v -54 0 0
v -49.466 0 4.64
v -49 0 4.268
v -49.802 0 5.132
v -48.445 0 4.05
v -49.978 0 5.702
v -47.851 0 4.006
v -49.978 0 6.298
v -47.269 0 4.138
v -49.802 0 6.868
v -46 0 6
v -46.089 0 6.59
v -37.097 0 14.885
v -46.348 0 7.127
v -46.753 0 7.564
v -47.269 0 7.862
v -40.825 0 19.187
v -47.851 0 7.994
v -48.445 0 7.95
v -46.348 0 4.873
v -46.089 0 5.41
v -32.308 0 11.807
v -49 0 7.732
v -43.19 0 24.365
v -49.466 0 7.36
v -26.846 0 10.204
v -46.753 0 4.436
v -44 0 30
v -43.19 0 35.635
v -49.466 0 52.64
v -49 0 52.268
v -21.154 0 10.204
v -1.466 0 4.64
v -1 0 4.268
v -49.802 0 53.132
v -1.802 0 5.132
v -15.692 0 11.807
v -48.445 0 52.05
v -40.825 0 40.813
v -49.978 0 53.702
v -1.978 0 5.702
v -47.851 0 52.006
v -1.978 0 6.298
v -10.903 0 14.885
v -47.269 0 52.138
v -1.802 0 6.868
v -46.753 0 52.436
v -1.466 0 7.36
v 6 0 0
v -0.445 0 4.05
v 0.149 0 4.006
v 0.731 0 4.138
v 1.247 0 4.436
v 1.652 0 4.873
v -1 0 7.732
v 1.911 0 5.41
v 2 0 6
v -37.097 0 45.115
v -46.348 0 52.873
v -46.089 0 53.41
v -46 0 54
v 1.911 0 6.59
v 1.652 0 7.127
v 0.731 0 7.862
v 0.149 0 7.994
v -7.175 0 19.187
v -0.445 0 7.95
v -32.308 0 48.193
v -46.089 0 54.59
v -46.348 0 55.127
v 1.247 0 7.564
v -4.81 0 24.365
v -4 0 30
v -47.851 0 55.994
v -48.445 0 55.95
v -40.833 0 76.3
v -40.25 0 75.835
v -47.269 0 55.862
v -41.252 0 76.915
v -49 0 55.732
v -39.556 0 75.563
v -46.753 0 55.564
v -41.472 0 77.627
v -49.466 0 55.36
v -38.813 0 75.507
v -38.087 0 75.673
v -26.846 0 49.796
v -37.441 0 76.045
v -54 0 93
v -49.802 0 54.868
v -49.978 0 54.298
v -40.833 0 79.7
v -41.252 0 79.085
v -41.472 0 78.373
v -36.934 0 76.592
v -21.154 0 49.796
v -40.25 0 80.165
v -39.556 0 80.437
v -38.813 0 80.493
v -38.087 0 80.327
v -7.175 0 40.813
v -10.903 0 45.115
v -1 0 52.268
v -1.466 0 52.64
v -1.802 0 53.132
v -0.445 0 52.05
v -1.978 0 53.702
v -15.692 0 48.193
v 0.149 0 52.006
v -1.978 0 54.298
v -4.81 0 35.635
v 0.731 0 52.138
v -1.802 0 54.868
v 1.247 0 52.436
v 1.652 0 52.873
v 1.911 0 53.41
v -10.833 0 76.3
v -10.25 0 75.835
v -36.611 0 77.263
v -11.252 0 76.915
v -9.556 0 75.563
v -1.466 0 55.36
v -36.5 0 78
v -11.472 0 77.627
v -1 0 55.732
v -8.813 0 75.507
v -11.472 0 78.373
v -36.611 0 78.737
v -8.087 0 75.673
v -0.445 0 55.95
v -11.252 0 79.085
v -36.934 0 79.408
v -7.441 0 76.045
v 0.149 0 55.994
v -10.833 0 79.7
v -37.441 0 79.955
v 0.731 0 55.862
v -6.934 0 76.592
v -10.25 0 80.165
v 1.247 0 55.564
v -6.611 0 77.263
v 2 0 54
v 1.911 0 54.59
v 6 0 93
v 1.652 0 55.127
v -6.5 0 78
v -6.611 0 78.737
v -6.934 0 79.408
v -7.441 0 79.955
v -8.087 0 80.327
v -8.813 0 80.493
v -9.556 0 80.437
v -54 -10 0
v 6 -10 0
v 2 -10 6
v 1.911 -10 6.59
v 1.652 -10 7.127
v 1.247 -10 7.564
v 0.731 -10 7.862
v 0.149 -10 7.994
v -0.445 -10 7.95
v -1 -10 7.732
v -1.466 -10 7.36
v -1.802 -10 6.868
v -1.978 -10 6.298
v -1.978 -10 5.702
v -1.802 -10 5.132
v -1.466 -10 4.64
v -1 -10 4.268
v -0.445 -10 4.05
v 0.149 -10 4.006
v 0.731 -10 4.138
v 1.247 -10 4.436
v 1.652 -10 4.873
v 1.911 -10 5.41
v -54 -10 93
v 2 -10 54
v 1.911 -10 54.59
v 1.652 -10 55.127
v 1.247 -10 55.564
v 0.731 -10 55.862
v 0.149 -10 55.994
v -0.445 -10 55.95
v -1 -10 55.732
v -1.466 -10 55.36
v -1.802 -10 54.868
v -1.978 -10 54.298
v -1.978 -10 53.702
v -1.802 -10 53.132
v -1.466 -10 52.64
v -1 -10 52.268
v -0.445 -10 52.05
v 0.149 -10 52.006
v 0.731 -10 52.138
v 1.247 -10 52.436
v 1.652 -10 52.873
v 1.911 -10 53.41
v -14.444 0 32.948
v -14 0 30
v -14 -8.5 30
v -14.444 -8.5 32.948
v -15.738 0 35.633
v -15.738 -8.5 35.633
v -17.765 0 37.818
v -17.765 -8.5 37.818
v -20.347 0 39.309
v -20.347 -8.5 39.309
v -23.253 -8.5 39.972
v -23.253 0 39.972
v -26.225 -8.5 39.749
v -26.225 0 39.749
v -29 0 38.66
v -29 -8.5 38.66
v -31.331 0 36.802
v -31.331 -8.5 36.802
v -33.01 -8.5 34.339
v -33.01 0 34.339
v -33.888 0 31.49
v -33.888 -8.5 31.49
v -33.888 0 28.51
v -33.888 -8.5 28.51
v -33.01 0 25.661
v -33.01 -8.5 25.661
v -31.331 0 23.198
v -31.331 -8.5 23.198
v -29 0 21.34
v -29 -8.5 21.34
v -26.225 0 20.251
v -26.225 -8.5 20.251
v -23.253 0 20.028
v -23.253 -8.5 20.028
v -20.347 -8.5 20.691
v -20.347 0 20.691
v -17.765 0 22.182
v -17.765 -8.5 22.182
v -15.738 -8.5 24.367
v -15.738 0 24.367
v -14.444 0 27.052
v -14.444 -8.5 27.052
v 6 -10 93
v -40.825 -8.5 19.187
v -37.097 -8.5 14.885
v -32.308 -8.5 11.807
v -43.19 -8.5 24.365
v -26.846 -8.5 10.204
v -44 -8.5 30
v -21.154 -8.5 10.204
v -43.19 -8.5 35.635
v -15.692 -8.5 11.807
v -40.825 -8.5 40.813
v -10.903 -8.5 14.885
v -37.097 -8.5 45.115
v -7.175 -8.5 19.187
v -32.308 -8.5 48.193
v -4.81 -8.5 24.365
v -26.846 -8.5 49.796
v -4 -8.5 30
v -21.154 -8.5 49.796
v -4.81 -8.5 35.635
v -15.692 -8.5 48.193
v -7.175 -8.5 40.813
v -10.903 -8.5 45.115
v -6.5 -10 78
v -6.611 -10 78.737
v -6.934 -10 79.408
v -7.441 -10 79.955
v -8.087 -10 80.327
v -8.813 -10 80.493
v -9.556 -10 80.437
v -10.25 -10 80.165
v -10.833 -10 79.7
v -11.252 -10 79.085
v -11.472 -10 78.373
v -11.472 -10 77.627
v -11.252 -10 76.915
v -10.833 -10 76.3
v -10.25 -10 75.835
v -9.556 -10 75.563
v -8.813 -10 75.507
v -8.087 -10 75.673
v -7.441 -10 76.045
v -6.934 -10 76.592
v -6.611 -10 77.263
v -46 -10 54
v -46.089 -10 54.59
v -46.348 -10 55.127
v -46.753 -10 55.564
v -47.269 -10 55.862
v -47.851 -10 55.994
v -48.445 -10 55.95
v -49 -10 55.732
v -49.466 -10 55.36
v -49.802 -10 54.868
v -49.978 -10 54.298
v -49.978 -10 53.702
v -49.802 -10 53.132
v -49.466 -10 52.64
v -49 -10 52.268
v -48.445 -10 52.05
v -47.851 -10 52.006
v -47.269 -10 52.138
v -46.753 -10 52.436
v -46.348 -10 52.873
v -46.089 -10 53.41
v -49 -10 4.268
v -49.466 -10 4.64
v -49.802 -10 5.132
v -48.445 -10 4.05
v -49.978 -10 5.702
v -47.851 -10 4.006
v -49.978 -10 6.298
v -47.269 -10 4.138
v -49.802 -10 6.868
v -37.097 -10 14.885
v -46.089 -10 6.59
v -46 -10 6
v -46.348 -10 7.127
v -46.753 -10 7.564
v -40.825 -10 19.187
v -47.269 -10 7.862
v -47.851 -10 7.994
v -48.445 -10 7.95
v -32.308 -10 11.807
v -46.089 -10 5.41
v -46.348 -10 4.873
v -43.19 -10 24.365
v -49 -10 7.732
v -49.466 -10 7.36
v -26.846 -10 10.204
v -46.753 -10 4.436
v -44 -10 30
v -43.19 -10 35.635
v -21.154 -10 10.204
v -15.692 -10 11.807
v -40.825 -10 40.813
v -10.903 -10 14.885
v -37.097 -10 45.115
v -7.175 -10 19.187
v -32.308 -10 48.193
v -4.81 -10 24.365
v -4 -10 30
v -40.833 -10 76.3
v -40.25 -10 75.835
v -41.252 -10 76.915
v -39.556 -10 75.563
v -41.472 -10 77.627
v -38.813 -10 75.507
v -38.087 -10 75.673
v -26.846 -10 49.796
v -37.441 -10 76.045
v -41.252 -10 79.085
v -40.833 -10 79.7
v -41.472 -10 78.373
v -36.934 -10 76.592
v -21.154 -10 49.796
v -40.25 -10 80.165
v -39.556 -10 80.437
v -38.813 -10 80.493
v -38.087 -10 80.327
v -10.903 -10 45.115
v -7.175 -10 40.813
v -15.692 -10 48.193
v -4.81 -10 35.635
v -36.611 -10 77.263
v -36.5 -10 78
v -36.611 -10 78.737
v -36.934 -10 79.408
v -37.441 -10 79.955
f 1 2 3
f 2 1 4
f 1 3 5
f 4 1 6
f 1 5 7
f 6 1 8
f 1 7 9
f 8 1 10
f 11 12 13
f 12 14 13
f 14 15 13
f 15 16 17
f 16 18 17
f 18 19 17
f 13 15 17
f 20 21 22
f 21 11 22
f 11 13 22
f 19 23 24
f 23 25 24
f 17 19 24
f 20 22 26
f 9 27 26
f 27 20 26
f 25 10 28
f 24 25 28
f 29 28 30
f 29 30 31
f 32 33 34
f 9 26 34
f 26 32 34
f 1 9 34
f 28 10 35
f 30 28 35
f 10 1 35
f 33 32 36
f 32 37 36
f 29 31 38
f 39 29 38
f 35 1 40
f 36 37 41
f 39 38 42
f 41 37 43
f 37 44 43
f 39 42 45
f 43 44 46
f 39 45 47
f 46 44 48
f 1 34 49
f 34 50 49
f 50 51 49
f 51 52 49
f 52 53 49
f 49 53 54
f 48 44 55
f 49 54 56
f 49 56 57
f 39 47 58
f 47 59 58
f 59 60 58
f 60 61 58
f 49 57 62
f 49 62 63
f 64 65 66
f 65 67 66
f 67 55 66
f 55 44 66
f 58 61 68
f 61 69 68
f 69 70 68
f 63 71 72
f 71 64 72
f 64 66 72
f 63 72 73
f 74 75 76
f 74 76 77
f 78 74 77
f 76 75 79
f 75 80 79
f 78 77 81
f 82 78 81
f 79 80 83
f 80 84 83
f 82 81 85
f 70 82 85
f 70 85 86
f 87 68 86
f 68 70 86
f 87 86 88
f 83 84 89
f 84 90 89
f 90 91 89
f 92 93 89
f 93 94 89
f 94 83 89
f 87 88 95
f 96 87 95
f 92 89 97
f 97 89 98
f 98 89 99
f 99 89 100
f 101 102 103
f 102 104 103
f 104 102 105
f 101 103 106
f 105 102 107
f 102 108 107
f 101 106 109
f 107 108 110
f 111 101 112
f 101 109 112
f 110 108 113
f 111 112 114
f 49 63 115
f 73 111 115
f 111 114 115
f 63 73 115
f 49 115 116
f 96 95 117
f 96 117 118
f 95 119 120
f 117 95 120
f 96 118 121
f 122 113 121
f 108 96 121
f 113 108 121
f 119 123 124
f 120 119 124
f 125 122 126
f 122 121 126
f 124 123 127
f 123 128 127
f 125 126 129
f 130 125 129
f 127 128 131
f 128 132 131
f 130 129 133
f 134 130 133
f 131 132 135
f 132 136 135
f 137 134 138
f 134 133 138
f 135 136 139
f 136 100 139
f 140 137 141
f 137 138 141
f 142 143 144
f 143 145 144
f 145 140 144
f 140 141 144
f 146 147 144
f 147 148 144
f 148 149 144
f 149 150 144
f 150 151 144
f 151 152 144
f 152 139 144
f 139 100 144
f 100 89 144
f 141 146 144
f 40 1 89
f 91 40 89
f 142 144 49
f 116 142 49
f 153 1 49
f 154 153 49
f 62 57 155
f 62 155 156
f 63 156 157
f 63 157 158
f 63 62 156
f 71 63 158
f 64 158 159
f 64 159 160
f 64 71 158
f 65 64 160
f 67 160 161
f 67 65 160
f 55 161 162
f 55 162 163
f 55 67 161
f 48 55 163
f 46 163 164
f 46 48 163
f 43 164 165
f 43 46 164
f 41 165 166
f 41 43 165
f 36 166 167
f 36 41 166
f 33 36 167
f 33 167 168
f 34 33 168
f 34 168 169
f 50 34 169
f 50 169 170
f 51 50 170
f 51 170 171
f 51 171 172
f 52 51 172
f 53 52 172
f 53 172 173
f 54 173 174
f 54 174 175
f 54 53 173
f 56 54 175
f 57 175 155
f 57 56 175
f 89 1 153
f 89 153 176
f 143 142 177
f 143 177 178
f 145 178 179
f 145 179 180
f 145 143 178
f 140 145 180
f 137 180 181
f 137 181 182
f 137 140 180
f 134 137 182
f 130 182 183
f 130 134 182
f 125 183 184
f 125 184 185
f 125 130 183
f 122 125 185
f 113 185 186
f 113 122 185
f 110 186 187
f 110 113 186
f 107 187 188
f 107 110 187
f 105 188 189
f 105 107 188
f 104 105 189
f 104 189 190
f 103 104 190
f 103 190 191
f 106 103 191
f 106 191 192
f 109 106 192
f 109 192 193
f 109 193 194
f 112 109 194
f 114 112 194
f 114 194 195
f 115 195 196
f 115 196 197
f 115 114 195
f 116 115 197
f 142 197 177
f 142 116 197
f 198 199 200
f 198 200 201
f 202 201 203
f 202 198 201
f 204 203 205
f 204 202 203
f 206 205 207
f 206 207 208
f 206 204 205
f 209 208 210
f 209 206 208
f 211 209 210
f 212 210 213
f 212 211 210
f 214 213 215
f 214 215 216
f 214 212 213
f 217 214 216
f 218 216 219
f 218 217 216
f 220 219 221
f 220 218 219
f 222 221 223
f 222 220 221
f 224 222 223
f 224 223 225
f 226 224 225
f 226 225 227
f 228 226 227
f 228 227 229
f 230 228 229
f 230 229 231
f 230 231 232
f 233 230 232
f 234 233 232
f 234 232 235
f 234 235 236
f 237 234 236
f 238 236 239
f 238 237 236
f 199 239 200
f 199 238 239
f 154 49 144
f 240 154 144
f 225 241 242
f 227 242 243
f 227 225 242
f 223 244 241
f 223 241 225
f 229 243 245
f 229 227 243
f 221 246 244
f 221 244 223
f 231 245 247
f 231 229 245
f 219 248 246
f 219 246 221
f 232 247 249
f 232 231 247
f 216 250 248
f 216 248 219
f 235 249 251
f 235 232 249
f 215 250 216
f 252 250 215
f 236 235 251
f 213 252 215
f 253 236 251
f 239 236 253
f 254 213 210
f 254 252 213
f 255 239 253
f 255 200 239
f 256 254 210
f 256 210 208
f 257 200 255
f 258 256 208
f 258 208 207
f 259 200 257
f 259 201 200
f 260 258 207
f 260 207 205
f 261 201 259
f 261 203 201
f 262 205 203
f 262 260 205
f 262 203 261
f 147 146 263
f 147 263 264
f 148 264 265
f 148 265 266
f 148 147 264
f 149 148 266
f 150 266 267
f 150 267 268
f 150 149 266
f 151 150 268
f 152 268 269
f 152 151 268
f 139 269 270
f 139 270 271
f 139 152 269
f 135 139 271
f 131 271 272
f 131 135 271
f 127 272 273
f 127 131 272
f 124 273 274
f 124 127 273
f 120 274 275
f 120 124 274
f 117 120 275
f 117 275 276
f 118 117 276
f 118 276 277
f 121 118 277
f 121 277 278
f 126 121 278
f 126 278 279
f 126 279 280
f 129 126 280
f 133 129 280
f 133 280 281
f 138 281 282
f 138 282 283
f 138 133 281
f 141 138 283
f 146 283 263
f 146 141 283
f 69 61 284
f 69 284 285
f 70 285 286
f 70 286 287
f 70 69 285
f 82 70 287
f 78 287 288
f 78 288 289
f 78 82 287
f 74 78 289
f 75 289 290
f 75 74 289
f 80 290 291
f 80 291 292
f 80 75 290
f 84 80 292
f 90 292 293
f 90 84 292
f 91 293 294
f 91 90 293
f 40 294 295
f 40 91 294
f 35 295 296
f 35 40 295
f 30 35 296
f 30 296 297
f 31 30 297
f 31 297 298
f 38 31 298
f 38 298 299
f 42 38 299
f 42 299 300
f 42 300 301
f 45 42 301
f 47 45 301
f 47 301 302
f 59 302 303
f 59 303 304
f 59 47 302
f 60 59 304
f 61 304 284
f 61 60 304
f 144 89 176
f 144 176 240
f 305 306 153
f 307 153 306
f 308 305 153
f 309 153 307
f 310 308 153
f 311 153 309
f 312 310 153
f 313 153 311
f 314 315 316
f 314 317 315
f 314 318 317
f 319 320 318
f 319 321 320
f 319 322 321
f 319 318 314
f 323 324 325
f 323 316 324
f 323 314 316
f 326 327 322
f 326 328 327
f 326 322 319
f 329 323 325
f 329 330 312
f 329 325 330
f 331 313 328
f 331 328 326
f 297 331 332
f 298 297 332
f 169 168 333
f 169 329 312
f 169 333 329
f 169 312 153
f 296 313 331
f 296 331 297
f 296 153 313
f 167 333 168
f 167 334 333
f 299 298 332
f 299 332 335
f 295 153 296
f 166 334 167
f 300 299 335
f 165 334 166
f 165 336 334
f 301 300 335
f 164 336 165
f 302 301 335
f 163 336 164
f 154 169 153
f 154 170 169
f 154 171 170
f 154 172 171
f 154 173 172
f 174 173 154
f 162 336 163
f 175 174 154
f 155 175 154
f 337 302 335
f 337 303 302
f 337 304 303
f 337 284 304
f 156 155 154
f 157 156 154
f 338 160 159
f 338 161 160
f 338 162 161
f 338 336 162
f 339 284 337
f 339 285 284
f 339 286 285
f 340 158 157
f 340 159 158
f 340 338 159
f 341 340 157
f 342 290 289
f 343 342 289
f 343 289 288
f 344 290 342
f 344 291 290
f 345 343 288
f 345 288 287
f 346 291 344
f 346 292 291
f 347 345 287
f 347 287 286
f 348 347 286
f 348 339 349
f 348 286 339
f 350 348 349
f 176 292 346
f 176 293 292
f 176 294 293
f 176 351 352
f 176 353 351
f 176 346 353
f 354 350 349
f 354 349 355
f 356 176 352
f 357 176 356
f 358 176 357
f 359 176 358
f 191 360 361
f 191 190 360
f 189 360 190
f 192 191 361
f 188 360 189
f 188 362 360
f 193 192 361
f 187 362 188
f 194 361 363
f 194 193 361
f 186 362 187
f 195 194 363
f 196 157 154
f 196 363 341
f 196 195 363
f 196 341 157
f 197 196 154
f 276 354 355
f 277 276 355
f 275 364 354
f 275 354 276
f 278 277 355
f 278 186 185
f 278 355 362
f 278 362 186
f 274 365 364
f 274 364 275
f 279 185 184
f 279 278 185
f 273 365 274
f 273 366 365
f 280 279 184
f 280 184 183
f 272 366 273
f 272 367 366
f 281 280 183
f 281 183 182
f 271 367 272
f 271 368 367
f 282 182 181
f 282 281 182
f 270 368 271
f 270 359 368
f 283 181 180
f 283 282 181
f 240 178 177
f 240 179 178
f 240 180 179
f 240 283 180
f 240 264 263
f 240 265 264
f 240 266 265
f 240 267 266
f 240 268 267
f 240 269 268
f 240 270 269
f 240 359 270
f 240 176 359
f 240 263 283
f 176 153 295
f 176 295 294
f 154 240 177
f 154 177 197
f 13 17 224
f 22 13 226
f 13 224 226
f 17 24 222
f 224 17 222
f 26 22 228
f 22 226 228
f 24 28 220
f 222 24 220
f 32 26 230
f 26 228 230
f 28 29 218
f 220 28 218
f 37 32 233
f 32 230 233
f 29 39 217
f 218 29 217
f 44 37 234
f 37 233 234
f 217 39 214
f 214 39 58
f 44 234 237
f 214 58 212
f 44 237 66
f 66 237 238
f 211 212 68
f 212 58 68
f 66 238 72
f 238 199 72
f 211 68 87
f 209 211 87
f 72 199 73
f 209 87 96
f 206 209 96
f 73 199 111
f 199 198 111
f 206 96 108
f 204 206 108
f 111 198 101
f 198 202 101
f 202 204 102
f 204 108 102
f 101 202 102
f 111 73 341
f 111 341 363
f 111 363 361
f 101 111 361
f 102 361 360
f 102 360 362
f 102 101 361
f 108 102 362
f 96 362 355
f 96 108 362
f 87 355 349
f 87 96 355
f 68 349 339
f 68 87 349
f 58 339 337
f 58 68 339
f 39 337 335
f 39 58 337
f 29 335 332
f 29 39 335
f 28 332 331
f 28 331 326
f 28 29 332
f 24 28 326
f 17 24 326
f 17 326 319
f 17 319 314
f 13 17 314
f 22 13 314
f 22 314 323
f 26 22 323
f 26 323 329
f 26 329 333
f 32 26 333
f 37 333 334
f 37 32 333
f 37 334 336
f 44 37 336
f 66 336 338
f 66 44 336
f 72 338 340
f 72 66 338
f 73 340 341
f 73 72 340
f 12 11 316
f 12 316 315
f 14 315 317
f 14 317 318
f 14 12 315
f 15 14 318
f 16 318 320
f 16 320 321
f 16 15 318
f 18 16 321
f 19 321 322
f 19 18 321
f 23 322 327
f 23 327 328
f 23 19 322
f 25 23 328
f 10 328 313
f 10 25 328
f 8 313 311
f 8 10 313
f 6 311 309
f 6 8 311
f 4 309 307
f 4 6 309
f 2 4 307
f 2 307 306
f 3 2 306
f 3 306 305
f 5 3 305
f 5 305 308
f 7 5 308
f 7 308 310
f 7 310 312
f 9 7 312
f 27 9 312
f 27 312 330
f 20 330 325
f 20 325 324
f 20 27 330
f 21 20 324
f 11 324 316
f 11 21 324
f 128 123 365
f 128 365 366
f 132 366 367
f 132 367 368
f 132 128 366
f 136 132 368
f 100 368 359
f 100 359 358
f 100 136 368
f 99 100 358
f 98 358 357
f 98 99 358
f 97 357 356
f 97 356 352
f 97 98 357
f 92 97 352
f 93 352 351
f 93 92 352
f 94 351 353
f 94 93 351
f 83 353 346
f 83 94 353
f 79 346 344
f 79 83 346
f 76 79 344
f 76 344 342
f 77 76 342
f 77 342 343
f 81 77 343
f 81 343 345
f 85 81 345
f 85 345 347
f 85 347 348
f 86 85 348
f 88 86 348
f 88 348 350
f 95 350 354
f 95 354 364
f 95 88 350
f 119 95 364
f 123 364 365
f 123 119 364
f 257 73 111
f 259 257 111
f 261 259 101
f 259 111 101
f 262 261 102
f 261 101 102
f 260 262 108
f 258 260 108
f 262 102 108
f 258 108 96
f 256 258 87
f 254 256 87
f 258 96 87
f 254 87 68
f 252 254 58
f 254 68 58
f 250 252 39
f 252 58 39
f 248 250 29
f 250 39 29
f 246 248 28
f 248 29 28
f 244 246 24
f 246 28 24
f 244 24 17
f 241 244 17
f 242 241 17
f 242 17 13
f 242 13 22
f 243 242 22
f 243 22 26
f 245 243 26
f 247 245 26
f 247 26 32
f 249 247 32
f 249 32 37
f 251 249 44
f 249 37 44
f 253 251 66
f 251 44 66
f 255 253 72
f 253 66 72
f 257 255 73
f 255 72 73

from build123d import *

# Parameters (mm, degrees)
F0_W     = 60
F0_H     = 93
F0_R     = 2
F0_R_2   = 20
F0_R_3   = 2.5
F1_DEPTH = 10
F0_R_4   = 10
F2_DEPTH = 8.5


with BuildPart() as f1:
    # F0 (on Front) → F1 (new body)
    with BuildSketch(Plane.XZ):
        with Locations((-24, 46.5)):
            Rectangle(F0_W, F0_H)
        with Locations((-48, 6)):
            Circle(F0_R, mode=Mode.SUBTRACT)
        with Locations((0, 6)):
            Circle(F0_R, mode=Mode.SUBTRACT)
        with Locations((-24, 30)):
            Circle(F0_R_2, mode=Mode.SUBTRACT)
        with Locations((-48, 54)):
            Circle(F0_R, mode=Mode.SUBTRACT)
        with Locations((-39, 78)):
            Circle(F0_R_3, mode=Mode.SUBTRACT)
        with Locations((0, 54)):
            Circle(F0_R, mode=Mode.SUBTRACT)
        with Locations((-9, 78)):
            Circle(F0_R_3, mode=Mode.SUBTRACT)
    extrude(amount=F1_DEPTH)


with BuildPart() as f2:
    # F0 (on Front) → F2 (new body)
    with BuildSketch(Plane.XZ):
        with Locations((-24, 30)):
            Circle(F0_R_2)
        with Locations((-24, 30)):
            Circle(F0_R_4, mode=Mode.SUBTRACT)
    extrude(amount=F2_DEPTH)


solid = Compound([f1.part, f2.part])
